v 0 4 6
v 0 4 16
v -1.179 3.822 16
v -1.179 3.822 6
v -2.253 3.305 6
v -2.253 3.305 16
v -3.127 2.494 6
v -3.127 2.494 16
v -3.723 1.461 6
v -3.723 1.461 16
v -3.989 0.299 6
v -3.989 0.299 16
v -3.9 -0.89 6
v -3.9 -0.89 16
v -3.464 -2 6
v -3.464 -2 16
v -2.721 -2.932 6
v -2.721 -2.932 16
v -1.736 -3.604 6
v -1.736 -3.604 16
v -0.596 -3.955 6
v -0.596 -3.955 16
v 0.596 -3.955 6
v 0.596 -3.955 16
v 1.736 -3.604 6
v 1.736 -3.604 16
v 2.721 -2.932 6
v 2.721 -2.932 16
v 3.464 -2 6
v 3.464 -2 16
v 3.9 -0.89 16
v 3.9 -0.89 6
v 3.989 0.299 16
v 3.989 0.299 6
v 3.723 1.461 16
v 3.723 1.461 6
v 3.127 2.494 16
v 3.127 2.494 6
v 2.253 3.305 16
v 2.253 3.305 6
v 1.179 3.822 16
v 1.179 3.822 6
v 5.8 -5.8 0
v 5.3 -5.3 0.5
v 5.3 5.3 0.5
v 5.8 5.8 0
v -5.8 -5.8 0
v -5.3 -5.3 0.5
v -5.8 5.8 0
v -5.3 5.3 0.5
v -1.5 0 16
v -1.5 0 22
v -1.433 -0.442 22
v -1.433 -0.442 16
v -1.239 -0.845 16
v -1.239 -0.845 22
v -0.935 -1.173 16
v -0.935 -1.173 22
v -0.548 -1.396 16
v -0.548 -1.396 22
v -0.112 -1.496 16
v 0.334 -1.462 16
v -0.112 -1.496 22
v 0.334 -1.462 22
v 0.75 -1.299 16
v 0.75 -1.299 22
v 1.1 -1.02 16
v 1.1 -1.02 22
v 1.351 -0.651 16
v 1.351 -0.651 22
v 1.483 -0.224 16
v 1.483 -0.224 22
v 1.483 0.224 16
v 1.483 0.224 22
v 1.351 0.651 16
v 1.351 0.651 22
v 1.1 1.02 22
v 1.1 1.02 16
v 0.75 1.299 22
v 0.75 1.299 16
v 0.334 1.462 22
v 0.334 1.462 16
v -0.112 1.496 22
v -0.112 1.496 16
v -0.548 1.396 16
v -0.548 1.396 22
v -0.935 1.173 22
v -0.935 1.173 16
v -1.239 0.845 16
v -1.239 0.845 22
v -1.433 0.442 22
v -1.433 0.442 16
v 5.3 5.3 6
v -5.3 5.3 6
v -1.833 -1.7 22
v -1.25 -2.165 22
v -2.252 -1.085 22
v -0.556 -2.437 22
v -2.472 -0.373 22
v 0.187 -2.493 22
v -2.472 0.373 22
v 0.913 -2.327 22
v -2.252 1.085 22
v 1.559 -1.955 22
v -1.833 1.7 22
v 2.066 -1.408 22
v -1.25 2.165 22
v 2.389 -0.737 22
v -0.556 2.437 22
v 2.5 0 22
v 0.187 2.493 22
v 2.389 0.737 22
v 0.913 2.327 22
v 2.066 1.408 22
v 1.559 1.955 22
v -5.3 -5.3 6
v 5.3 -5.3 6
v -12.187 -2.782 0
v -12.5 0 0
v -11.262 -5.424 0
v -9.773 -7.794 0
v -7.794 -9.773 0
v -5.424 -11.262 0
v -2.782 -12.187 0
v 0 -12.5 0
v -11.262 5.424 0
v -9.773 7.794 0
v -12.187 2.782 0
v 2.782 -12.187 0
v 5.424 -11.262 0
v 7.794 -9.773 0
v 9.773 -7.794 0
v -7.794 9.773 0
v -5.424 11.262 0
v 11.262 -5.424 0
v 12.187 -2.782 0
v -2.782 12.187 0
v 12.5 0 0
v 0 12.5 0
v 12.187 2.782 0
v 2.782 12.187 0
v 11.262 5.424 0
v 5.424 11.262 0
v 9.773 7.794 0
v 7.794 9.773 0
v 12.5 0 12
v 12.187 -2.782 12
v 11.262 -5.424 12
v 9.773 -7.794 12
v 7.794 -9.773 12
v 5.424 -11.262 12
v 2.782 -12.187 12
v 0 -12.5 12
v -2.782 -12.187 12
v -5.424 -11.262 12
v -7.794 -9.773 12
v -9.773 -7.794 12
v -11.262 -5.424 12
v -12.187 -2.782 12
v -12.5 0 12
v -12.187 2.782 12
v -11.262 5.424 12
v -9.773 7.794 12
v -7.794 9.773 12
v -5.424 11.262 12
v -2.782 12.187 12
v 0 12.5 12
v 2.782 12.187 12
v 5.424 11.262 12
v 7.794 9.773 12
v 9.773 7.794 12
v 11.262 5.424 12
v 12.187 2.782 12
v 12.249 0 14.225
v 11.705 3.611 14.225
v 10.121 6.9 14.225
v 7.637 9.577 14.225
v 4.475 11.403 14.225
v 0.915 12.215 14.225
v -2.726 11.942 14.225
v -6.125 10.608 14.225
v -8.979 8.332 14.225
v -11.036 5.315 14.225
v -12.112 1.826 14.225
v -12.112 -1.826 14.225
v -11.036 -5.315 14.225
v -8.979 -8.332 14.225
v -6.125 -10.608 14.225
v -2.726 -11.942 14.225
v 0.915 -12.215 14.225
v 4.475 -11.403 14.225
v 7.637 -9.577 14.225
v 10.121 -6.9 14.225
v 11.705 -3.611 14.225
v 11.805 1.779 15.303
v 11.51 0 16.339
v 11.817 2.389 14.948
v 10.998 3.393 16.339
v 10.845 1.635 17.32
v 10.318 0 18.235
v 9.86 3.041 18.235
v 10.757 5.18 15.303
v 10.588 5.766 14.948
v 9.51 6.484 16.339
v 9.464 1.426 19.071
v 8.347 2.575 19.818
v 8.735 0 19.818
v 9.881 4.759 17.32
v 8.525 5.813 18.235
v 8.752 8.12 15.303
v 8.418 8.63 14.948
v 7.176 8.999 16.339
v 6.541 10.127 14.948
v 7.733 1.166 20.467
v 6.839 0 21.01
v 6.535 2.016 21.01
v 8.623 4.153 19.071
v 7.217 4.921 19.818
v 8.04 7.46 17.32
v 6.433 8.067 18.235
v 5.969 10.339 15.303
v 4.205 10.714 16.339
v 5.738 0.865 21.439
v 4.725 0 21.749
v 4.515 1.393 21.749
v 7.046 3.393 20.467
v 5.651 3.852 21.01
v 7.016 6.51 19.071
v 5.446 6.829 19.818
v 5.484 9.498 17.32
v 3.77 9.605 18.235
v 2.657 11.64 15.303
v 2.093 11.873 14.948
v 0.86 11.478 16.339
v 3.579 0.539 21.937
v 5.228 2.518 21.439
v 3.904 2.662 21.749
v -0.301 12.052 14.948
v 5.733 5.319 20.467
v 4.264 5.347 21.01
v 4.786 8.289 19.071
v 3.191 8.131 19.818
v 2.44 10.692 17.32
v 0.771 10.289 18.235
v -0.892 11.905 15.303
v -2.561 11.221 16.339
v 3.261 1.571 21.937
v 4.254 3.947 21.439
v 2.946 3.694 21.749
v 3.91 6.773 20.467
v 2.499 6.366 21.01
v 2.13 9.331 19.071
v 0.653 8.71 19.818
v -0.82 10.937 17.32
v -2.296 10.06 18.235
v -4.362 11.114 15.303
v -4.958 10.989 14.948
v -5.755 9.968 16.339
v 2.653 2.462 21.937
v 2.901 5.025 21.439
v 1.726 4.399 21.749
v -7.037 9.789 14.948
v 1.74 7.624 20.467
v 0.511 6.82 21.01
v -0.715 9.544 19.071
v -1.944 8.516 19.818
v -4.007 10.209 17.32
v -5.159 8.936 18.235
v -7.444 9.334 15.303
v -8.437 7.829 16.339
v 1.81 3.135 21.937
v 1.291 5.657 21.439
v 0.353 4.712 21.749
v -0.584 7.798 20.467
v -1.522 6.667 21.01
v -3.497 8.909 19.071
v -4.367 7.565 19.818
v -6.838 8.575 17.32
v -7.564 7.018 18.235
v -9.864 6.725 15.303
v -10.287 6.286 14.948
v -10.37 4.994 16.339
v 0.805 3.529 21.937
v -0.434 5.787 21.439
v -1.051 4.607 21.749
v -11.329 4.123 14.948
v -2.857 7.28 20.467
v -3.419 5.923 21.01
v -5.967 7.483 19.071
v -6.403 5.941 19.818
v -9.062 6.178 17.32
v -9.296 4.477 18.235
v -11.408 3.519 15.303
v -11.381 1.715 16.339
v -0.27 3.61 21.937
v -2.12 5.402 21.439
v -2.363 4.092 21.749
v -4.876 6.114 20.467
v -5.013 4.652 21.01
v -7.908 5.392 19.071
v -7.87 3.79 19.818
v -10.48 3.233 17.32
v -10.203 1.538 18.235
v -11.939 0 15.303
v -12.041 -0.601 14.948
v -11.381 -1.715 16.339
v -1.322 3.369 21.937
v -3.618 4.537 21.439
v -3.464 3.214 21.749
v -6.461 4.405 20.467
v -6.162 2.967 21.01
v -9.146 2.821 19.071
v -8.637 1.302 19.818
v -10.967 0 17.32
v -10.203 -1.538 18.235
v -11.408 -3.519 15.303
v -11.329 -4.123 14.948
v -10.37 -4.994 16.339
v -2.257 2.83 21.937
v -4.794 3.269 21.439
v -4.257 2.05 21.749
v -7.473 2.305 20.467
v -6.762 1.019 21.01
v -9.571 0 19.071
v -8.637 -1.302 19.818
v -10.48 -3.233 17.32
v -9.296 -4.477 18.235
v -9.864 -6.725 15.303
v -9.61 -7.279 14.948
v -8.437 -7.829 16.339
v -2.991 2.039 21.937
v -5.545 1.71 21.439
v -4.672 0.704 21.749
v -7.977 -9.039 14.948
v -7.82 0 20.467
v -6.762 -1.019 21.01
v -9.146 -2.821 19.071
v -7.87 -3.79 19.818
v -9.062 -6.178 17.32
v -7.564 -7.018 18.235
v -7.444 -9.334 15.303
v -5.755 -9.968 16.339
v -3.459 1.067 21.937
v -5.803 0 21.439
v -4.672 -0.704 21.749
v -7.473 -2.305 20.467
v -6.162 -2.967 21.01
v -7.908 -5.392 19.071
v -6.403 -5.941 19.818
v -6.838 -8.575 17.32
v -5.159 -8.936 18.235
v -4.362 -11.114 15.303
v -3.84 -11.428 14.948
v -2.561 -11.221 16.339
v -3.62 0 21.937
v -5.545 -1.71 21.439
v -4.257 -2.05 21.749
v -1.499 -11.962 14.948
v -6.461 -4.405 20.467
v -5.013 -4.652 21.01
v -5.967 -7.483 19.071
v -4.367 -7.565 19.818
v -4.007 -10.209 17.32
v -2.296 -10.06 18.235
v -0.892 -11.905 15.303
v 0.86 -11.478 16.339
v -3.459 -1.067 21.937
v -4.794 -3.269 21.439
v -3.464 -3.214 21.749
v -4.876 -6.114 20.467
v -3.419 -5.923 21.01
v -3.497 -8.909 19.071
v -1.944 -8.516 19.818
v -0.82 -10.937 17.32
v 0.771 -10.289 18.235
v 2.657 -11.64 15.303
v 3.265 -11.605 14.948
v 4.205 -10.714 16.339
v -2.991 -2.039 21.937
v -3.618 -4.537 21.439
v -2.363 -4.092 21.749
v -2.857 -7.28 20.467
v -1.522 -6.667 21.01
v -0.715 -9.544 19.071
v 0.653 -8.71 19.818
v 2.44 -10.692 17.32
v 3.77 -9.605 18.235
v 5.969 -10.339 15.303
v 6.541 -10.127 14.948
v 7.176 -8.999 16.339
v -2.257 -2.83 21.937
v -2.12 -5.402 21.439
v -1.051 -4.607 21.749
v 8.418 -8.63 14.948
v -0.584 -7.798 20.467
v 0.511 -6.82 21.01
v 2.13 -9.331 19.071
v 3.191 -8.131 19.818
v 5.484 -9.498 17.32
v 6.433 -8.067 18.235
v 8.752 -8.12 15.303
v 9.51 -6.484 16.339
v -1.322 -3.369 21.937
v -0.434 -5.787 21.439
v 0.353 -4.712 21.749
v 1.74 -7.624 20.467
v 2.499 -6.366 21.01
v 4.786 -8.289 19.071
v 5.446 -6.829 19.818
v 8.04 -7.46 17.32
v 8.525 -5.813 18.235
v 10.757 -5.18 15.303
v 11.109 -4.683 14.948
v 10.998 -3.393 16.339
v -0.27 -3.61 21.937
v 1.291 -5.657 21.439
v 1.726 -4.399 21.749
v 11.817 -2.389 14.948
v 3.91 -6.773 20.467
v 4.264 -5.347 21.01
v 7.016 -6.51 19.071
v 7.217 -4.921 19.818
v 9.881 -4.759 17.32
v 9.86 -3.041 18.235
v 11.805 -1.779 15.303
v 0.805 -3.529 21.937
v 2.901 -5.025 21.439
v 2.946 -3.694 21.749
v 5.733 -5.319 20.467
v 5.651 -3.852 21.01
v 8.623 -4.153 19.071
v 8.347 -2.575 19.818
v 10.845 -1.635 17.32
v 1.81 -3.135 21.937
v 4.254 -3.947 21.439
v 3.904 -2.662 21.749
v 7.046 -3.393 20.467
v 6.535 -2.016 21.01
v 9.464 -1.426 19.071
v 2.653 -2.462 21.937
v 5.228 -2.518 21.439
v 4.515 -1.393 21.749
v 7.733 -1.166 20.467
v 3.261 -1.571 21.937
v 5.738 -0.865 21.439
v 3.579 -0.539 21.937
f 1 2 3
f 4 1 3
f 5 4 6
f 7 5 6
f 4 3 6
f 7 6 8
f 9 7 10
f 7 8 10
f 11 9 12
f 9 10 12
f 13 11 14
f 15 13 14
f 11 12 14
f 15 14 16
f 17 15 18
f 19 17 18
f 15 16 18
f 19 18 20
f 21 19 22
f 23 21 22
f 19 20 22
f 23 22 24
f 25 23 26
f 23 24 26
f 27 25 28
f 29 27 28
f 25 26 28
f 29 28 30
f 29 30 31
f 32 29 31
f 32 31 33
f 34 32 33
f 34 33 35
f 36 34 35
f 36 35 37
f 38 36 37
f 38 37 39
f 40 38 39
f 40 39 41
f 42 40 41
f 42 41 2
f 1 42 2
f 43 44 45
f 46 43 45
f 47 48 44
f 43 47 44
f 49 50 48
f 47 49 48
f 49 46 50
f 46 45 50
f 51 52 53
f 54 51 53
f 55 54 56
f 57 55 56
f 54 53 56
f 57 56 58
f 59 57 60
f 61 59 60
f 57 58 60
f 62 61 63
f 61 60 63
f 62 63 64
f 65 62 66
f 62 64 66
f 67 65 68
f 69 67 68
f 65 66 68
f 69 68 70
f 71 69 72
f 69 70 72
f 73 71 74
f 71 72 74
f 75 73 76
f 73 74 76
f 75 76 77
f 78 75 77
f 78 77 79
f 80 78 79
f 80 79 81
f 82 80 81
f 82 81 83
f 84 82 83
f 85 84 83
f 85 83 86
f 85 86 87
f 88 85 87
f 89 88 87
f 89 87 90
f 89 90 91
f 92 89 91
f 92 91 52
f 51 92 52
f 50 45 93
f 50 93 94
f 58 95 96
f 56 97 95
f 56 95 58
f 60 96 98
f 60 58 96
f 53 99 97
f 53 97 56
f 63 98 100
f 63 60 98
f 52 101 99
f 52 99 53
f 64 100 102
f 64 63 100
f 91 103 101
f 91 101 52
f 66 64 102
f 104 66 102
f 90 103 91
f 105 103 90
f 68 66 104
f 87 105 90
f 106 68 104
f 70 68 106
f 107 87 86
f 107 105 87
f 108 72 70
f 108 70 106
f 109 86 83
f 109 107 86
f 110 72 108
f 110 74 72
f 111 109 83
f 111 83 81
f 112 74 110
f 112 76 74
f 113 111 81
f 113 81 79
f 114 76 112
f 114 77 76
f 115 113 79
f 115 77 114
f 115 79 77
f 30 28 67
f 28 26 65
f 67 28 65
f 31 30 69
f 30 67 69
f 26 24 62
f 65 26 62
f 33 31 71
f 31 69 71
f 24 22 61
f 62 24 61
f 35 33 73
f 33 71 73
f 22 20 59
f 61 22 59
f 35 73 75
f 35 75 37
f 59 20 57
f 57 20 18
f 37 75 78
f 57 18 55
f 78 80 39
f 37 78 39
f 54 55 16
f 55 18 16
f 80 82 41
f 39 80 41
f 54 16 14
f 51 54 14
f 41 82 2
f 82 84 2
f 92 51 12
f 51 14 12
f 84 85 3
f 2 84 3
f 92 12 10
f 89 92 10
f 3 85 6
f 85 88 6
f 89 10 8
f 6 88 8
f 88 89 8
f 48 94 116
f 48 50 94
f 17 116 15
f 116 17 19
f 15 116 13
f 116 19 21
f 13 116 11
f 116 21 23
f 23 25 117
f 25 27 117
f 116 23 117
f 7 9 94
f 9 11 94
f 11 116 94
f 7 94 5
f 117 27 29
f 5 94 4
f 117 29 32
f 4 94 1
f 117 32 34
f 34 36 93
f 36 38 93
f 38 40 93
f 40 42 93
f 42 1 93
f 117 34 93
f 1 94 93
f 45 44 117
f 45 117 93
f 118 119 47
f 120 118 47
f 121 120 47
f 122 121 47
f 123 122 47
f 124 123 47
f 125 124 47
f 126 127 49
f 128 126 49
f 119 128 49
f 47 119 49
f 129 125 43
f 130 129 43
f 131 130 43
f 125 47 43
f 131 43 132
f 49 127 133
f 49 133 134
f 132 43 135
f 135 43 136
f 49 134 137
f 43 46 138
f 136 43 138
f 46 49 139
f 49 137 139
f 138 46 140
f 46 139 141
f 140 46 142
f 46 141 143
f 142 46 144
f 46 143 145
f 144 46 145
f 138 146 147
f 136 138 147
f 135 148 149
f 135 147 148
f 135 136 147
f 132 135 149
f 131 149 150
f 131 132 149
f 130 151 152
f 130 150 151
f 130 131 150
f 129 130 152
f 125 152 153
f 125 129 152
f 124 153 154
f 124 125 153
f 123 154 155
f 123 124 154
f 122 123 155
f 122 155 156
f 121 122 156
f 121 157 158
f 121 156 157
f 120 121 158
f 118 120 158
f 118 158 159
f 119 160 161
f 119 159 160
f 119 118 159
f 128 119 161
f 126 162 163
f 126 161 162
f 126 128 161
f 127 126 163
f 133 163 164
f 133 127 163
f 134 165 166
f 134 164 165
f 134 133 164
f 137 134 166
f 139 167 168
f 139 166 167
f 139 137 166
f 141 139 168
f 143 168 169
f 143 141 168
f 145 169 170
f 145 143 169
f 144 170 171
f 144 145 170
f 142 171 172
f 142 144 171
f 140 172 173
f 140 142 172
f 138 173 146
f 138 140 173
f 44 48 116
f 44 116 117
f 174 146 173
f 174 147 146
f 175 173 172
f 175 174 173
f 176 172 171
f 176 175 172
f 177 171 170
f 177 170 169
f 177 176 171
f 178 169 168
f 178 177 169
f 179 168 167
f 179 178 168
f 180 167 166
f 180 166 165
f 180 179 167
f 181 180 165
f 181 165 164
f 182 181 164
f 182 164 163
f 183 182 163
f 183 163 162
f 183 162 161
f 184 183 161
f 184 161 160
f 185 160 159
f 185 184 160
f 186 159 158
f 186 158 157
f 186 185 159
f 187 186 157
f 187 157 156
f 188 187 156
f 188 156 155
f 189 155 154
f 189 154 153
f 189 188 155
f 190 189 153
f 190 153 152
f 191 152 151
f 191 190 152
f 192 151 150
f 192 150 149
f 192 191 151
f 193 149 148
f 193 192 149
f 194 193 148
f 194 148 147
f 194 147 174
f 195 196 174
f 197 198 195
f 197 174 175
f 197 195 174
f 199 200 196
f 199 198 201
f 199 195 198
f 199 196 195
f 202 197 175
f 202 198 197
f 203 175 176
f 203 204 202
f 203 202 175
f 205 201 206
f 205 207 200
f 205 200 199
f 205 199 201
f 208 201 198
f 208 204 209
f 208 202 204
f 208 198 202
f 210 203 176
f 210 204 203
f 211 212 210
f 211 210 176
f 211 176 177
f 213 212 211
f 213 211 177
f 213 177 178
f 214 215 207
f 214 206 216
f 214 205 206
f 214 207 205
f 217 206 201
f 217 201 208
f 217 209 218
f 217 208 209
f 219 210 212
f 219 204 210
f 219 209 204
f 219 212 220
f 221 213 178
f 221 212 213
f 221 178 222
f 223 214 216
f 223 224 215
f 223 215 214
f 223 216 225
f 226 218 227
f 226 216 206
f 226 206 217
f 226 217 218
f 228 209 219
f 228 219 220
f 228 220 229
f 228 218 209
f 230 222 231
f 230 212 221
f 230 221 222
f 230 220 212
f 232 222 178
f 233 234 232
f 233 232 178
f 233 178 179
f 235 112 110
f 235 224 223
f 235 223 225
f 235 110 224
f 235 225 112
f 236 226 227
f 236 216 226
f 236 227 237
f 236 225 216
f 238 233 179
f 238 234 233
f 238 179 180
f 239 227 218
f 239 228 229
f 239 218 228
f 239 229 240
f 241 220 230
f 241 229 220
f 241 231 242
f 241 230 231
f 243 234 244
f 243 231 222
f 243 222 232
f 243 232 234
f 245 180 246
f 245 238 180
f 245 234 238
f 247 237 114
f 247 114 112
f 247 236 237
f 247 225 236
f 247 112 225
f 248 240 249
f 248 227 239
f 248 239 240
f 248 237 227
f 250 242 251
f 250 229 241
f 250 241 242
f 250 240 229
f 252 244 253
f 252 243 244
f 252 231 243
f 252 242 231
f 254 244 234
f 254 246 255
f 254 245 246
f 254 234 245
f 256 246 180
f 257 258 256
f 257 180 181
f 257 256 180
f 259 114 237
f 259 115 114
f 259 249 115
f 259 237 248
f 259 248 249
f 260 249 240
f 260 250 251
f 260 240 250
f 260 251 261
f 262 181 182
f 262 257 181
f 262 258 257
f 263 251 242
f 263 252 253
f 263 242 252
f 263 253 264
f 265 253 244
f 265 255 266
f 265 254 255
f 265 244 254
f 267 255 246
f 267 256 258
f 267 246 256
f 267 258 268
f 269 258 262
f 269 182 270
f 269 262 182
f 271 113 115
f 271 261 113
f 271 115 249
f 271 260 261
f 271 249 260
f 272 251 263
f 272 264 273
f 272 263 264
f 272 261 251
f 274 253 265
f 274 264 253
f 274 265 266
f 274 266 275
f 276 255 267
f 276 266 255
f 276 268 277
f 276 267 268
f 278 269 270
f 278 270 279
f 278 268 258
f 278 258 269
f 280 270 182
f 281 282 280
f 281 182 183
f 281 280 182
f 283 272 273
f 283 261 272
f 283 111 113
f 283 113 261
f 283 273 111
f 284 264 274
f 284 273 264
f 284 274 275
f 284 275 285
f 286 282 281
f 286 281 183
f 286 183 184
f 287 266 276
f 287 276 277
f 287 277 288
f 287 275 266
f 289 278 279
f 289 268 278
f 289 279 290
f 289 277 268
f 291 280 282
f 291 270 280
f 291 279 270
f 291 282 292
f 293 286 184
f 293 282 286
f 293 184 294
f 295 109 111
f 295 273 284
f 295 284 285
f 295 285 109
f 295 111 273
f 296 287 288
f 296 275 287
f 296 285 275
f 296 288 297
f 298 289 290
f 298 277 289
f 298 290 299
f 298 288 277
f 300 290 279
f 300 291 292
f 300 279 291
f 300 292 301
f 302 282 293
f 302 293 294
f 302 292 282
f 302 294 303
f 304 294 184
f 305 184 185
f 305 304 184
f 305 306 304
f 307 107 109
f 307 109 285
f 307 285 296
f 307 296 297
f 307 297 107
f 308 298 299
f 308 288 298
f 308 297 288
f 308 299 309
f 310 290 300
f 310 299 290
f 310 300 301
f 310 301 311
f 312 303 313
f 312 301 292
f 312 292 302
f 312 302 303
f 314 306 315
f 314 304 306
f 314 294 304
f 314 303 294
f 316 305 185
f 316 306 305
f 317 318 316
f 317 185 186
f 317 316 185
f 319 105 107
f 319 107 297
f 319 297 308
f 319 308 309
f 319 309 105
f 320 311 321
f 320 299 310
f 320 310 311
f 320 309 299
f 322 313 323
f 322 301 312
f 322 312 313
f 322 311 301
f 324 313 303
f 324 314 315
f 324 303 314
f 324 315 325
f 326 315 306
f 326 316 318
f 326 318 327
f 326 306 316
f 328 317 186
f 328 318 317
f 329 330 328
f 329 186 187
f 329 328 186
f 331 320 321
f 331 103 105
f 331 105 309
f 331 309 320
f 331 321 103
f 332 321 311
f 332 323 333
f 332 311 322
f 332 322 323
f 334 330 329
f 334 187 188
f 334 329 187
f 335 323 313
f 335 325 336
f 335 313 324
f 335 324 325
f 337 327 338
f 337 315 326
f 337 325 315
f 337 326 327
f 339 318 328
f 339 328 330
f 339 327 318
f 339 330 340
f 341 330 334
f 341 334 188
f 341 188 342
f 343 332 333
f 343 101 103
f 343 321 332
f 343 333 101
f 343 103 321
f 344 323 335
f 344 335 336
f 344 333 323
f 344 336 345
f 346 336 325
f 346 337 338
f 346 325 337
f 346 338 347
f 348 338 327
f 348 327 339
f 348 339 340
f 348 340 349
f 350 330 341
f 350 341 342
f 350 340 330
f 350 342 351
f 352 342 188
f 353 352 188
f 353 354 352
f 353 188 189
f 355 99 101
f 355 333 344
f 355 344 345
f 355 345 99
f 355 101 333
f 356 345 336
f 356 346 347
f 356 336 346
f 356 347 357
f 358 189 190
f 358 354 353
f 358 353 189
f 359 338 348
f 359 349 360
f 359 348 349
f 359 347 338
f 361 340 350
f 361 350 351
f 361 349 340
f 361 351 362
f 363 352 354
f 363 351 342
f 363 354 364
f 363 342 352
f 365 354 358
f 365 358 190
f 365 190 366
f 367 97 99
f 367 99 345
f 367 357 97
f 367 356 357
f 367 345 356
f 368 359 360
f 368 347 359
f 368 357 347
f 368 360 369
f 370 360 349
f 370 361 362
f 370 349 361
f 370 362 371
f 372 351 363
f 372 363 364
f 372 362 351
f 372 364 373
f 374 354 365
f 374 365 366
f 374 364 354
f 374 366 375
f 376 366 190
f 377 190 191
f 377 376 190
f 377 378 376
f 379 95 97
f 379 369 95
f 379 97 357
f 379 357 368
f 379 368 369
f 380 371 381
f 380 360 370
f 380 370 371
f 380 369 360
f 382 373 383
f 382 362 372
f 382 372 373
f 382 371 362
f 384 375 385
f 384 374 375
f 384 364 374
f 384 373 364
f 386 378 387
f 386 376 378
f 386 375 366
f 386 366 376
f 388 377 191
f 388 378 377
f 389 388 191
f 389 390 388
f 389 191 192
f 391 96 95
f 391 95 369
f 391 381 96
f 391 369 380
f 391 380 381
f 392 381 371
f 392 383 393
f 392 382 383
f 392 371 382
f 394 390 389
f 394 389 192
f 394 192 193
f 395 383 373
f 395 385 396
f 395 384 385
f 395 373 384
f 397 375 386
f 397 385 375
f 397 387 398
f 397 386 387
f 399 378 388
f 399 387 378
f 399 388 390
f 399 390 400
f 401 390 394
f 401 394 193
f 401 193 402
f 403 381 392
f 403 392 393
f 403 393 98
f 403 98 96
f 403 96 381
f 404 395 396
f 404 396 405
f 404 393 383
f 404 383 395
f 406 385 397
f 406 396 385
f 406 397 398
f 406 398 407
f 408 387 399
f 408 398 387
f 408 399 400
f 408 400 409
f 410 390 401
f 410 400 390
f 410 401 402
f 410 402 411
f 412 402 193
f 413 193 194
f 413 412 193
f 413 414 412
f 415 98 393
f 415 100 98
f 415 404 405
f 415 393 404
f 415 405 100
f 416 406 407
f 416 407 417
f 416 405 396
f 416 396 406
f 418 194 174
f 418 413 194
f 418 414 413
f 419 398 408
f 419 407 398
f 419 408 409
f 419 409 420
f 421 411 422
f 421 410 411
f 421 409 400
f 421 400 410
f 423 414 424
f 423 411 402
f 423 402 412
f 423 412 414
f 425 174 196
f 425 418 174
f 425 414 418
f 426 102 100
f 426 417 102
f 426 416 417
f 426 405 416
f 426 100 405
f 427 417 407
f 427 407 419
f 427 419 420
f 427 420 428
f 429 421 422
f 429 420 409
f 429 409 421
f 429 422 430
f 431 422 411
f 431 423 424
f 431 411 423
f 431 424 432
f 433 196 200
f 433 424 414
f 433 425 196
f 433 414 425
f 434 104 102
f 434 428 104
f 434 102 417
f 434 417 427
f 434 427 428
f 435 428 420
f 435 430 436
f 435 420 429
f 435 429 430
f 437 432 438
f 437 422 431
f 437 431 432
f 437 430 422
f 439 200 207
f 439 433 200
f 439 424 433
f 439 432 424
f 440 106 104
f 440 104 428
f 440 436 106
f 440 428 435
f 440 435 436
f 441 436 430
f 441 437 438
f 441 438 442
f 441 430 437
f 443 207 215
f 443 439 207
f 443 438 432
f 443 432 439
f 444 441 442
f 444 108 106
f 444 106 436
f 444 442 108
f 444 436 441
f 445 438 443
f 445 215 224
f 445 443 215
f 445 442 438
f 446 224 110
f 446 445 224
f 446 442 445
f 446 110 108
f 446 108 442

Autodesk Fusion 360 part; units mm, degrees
sketch "Esquisse1" plane through (0, 0, 0) normal (0, 0, 1) x (1, 0, 0)
  circle A0 centre (0, 0) radius 12.5
  line L0 (-5.3, -5.3) -> (5.3, -5.3)
  line L1 (5.3, -5.3) -> (5.3, 5.3)
  line L2 (5.3, 5.3) -> (-5.3, 5.3)
  line L3 (-5.3, 5.3) -> (-5.3, -5.3)
  dimension "d1" = 25
  dimension "d4" = 10.6
  dimension "d5" = 5.3
  dimension "d6" = 5.3
extrude "Extrusion1" add sketch "Esquisse1" along normal blind 22 contours A0 | L0 L1 L2 L3
extrude "Extrusion2" cut sketch "Esquisse1" along normal blind 6 contours L0 L1 L2 L3
sketch "Esquisse2" plane through (0, 0, 22) normal (0, 0, 1) x (-1, 0, 0)
  circle A0 centre (0, 0) radius 12.5
  circle A1 centre (0, 0) radius 1.5
  dimension "d9" = 3
extrude "Extrusion3" cut sketch "Esquisse2" against normal blind 22 contours A1
hole "Perçage2" at (0, 0, 6) direction (0, 0, 1) diameter 8 depth 10 tip angle 180
fillet "Congé1" radius 10 1 edges at (-11.6541, -4.5202, 22)
chamfer "Chanfrein1" distance 0.5 angle 45 4 edges at (-5.3, 0, 0) (0, -5.3, 0) (5.3, 0, 0) (0, 5.3, 0)
equation "d5 = d4 / 2"
equation "d6 = d5"
